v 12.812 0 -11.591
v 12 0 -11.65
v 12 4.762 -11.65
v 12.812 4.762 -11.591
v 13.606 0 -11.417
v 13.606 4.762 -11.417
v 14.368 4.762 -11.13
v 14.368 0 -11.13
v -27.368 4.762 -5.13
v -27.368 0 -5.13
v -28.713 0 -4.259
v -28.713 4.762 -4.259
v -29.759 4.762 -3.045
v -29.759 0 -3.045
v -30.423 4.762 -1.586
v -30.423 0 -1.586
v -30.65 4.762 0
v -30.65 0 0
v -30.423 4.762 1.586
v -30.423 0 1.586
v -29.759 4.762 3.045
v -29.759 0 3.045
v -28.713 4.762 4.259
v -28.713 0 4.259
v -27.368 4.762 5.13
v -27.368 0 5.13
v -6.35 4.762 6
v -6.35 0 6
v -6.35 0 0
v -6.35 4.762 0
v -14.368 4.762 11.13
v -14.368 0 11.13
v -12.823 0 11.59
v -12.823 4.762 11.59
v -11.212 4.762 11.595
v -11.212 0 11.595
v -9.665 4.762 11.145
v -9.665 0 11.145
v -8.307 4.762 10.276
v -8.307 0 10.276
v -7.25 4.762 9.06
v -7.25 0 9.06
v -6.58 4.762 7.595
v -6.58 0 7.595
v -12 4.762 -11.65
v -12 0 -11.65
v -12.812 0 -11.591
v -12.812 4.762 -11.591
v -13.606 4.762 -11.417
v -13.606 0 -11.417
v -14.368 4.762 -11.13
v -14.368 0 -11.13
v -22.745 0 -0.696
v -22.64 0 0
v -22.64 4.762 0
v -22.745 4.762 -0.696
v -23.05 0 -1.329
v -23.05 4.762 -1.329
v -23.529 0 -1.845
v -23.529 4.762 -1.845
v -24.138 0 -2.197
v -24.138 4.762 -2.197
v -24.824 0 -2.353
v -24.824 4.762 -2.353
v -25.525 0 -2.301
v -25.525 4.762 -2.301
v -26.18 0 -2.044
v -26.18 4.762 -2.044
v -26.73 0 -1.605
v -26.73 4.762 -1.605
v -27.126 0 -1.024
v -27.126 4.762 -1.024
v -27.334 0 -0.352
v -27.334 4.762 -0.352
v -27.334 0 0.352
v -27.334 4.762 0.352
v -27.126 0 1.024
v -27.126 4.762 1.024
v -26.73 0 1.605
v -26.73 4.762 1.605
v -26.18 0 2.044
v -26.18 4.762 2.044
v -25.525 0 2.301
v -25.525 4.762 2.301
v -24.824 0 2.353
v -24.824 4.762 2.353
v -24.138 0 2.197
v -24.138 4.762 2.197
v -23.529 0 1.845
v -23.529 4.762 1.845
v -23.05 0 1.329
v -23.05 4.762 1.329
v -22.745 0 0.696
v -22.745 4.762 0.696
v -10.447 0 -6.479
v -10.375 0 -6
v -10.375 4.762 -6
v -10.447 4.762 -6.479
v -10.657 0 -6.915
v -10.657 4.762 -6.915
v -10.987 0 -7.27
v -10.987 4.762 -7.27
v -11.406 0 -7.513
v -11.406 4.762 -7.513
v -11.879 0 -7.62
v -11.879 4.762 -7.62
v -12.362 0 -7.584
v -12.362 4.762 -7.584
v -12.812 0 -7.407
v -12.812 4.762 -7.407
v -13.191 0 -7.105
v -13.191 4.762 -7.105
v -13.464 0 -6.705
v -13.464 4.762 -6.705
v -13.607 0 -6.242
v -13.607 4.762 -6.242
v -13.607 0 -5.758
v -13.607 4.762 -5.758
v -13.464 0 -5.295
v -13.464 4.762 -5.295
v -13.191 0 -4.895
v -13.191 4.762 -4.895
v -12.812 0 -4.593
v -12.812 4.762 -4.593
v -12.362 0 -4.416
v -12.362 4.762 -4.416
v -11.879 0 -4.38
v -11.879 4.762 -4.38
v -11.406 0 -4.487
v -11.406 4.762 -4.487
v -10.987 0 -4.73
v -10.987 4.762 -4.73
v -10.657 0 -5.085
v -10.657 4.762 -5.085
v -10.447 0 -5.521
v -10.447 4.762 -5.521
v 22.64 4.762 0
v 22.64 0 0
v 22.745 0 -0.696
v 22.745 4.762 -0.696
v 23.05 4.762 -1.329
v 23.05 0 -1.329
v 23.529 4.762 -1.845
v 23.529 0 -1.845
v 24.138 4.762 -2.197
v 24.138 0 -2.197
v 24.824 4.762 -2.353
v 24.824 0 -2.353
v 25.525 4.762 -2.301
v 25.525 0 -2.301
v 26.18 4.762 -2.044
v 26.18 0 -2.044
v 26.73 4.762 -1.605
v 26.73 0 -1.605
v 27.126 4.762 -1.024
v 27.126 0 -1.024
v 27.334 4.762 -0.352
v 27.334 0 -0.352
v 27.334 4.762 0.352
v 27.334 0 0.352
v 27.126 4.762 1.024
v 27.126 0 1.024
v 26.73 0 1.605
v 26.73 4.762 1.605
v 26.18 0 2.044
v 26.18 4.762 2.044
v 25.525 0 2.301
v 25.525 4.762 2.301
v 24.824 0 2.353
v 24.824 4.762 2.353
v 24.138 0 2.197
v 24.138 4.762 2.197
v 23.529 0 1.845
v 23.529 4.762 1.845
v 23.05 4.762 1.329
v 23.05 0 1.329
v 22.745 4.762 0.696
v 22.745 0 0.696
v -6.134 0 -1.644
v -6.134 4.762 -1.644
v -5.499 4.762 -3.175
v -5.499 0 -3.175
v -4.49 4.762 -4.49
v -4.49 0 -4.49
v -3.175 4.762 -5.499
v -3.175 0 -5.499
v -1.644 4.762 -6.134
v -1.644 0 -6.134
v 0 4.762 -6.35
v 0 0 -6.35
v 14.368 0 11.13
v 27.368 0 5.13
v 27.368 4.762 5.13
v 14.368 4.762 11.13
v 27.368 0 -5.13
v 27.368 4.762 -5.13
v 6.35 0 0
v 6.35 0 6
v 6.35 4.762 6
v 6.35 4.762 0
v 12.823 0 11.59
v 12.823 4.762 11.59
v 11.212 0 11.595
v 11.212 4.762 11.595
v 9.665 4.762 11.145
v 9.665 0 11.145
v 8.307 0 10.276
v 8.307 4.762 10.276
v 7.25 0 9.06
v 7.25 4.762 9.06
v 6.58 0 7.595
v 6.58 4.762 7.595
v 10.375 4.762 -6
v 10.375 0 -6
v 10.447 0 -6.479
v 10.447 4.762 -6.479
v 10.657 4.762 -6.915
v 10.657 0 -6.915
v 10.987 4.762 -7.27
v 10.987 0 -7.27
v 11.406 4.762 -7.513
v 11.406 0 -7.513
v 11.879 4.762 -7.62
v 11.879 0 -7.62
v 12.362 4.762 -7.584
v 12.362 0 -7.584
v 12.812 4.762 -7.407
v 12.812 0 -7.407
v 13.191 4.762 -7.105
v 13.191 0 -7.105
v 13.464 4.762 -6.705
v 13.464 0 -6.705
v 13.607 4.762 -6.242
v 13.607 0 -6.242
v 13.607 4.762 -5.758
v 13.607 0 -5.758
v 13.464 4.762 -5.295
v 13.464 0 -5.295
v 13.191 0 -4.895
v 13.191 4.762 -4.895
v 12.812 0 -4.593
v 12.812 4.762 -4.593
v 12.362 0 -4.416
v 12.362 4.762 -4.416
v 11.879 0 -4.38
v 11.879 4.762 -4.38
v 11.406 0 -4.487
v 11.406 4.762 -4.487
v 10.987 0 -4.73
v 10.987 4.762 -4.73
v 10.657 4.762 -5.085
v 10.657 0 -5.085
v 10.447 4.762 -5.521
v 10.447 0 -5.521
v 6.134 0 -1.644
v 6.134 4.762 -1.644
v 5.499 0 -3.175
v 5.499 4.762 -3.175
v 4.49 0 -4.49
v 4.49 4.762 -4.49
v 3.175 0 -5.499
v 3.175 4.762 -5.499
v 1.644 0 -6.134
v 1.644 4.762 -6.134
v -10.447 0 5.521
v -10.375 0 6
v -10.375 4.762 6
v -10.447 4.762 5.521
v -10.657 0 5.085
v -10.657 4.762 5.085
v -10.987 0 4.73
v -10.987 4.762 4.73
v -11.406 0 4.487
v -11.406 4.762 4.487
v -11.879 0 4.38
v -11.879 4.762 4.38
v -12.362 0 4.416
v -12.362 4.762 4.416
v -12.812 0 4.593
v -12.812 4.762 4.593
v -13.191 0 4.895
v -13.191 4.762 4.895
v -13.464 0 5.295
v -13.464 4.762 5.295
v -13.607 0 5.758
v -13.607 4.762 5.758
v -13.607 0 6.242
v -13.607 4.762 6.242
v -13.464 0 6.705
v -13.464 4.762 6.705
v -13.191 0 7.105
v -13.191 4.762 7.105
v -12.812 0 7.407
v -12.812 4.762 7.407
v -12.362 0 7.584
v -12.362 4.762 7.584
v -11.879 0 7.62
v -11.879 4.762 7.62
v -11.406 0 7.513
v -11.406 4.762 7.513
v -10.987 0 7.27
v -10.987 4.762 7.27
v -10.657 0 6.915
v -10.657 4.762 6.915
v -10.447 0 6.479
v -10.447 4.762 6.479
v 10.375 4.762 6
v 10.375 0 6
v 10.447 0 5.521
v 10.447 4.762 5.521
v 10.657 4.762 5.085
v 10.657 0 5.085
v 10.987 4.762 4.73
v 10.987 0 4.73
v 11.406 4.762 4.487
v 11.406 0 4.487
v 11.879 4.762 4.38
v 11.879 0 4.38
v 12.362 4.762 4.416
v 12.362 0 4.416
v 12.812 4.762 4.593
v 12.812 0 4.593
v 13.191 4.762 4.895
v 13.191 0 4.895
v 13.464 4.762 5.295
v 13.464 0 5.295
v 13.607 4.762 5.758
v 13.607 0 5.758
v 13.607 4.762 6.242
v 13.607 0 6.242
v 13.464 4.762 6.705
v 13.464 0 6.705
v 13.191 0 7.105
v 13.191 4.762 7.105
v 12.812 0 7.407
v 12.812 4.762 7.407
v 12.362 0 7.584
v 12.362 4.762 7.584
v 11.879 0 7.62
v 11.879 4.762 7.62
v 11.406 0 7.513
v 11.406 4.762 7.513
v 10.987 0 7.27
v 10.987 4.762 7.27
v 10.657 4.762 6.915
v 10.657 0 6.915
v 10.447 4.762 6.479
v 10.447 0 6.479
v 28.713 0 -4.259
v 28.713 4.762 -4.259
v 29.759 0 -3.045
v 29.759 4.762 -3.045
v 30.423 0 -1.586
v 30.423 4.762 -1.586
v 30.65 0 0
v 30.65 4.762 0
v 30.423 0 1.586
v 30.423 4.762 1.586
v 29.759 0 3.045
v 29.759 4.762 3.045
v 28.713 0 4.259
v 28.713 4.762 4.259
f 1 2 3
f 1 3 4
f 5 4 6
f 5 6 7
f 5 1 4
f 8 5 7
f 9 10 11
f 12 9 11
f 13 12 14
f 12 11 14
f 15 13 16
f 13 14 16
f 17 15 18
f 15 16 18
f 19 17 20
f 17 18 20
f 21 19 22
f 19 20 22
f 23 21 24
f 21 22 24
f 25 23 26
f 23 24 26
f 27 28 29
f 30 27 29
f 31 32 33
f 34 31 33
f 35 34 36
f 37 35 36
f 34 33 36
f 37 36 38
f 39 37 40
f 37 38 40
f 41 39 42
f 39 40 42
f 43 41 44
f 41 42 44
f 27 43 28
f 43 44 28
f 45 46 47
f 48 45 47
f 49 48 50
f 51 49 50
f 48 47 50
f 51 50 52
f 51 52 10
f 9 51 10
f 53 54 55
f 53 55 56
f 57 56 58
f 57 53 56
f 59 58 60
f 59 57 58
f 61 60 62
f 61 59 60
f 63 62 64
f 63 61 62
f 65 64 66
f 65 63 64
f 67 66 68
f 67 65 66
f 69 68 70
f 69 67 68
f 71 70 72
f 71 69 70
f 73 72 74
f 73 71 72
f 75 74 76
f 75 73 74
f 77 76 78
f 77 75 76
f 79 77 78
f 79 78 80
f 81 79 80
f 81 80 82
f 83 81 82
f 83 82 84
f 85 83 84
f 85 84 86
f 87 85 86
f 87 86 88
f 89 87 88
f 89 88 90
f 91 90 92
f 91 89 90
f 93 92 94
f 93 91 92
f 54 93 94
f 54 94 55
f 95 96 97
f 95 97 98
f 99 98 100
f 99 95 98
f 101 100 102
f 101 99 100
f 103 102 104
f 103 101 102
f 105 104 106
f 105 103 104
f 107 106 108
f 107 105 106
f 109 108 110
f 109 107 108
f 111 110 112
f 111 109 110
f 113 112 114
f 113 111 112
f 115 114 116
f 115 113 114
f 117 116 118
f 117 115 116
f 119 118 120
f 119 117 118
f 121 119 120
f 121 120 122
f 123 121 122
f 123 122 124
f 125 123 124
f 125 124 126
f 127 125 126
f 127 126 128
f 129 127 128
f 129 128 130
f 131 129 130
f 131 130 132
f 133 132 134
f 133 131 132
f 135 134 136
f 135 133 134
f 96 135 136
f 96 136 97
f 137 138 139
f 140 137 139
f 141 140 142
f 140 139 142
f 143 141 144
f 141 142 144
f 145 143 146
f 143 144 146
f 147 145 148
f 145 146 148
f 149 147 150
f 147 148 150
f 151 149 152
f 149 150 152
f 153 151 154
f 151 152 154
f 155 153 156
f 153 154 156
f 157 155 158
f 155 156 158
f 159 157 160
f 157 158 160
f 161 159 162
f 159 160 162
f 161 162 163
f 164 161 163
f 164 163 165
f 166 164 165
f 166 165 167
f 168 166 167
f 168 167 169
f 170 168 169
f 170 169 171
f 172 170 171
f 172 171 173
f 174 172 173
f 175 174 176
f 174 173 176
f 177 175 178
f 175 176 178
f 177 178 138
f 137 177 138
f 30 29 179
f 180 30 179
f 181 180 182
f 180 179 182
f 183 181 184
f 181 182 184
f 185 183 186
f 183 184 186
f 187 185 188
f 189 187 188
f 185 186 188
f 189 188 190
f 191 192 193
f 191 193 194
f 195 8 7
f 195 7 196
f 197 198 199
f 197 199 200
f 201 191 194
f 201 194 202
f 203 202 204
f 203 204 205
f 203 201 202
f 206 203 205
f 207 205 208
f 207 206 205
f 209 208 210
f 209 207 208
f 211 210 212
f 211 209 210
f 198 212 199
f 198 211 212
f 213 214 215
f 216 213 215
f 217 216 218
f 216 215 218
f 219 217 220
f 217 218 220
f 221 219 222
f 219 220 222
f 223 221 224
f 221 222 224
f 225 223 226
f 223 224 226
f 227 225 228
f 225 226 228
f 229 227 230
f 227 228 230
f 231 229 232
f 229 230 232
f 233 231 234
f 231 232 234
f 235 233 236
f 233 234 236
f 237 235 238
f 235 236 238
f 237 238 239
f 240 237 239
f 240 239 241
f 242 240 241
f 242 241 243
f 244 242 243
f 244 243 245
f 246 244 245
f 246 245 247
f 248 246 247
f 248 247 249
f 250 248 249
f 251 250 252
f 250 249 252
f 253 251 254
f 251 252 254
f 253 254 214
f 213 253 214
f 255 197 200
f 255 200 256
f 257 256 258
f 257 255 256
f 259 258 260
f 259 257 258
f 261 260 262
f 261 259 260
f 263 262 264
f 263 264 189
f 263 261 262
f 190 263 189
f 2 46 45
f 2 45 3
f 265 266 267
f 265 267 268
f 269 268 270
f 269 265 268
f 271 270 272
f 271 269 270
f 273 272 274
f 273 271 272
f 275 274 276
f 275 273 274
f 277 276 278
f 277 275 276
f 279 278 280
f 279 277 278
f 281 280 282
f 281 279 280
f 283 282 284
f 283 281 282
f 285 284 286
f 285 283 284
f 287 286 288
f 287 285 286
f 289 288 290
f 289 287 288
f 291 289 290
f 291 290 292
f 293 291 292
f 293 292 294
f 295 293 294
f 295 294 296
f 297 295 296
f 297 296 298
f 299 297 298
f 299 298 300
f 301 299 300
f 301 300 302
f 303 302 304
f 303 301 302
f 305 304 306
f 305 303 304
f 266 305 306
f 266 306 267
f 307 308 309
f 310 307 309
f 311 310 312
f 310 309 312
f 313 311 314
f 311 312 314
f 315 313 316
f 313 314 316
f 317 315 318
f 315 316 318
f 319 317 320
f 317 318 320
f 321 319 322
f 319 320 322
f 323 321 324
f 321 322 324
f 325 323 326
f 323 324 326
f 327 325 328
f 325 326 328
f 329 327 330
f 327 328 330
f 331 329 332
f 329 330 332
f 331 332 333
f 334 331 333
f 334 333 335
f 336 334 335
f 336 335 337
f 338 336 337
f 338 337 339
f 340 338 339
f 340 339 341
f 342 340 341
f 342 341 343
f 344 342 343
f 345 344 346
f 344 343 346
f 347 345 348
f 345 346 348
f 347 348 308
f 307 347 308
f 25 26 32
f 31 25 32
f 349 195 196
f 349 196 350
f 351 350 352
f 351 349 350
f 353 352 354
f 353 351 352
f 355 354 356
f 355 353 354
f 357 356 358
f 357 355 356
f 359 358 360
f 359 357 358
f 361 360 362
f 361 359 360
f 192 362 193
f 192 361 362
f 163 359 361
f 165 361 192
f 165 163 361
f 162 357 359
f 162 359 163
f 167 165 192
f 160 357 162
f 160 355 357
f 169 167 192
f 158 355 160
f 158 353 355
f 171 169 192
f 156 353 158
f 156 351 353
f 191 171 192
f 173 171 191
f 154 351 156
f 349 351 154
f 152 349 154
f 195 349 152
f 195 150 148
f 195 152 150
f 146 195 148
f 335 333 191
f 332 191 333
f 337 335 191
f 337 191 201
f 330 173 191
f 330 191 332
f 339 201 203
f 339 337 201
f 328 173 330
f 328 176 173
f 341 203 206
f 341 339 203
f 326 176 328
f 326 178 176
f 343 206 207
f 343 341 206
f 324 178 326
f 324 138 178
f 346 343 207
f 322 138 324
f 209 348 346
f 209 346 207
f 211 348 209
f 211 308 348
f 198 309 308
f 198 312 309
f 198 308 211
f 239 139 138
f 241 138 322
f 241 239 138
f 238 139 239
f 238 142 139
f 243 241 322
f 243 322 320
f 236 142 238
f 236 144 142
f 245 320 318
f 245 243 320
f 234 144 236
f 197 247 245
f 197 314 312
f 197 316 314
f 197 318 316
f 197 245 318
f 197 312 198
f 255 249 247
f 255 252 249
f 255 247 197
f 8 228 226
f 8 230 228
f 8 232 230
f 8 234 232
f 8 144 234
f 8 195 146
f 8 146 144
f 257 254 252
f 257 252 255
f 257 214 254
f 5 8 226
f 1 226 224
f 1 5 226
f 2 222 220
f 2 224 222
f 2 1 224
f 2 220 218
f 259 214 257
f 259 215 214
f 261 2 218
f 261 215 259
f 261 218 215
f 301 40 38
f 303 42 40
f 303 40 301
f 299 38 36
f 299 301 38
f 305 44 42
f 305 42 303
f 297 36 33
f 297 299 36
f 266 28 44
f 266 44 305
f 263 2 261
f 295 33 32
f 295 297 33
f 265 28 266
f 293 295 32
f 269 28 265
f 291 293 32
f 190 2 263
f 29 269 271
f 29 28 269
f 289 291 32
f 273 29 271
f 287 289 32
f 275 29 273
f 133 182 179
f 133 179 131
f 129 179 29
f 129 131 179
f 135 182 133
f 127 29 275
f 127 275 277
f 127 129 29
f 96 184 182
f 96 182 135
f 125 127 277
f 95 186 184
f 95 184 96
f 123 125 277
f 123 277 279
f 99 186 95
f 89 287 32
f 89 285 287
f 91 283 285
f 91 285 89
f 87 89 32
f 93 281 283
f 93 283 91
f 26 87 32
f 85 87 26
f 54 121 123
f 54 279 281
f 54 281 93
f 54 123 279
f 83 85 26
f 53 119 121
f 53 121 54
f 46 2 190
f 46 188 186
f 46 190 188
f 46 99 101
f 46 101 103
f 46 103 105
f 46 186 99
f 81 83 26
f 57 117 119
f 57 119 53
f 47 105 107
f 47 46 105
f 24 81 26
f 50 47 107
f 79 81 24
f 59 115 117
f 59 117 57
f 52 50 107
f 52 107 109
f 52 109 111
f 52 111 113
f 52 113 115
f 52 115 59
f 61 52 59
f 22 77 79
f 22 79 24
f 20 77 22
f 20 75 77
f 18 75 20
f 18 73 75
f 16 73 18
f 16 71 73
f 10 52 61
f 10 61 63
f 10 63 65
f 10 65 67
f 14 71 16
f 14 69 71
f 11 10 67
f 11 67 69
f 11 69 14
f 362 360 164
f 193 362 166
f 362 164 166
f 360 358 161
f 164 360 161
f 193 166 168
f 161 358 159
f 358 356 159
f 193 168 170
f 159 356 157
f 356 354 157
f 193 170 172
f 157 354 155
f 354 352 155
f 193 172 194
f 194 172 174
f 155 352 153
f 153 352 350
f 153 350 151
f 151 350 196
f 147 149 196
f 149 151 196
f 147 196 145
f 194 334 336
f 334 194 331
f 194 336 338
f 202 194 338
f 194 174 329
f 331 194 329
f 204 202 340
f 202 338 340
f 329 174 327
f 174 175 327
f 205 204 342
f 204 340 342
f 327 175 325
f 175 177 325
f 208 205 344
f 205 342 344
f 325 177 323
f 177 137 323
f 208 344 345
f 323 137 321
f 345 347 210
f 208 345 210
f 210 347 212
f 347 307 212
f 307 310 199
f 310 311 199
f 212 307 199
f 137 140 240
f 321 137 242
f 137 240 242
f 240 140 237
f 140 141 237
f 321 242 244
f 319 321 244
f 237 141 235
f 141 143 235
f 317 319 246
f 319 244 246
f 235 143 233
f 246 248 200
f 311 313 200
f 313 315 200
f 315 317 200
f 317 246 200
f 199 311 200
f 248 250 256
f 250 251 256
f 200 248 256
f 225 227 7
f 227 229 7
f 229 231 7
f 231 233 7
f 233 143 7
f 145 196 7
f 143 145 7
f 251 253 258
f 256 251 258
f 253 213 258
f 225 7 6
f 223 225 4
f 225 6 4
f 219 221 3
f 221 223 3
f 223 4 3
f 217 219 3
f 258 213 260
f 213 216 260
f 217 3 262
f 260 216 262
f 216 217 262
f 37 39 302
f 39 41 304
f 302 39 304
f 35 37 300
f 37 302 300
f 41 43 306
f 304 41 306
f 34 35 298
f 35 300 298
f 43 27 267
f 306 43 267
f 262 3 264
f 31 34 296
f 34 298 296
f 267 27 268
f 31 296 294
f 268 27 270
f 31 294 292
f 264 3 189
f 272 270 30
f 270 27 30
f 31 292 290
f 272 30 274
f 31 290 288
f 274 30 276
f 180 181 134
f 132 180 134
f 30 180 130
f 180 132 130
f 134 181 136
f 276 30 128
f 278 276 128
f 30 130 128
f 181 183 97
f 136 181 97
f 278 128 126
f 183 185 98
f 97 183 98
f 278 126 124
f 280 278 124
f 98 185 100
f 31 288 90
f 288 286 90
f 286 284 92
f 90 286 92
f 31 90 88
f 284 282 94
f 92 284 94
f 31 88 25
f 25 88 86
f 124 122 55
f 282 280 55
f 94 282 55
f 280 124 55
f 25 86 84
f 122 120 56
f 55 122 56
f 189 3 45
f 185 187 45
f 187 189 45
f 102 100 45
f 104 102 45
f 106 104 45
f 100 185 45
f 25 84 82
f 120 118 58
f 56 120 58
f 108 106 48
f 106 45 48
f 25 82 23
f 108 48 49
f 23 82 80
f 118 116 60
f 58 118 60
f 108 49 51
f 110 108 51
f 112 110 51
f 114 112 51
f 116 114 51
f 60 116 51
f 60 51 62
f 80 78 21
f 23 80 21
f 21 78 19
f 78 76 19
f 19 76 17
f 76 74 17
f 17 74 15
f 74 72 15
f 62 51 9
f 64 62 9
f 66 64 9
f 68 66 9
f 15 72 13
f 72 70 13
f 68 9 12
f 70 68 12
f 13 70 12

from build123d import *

# Parameters (mm, degrees)
SKETCH1_R           = 2.36
SKETCH1_R_2         = 1.625
BOSS_EXTRUDE1_DEPTH = 4.7625


with BuildPart() as part:
    # Sketch1 → Boss-Extrude1 (new body)
    with BuildSketch(Plane(origin=(0, 0, 0), x_dir=(1, 0, 0), z_dir=(0, 1, 0))):
        with BuildLine():
            Line((0, 6.35), (0, 11.65))
            Line((0, 11.65), (-12, 11.65))
            ThreePointArc((-12, 11.65), (-13.212057455, 11.518461446), (-14.367678703, 11.129970522))
            Line((-14.367678703, 11.129970522), (-27.367678703, 5.129970522))
            ThreePointArc((-27.367678703, 5.129970522), (-30.65, 0), (-27.367678703, -5.129970522))
            Line((-27.367678703, -5.129970522), (-14.367678703, -11.129970522))
            ThreePointArc((-14.367678703, -11.129970522), (-8.954912536, -10.759195555), (-6.35, -6))
            Line((-6.35, -6), (-6.35, 0))
            ThreePointArc((-6.35, 0), (-4.490128061, 4.490128061), (0, 6.35))
        make_face()
        with Locations((-25, 0)):
            Circle(SKETCH1_R, mode=Mode.SUBTRACT)
        with Locations((-12, 6)):
            Circle(SKETCH1_R_2, mode=Mode.SUBTRACT)
        with Locations((-12, -6)):
            Circle(SKETCH1_R_2, mode=Mode.SUBTRACT)
    boss_extrude1 = extrude(amount=BOSS_EXTRUDE1_DEPTH)

    # Mirror1: Boss-Extrude1 across plane
    add(boss_extrude1.mirror(Plane(origin=(0, 4.7625, -6.35), x_dir=(0, 0, 1), z_dir=(-1, 0, 0))))


solid = part.part
